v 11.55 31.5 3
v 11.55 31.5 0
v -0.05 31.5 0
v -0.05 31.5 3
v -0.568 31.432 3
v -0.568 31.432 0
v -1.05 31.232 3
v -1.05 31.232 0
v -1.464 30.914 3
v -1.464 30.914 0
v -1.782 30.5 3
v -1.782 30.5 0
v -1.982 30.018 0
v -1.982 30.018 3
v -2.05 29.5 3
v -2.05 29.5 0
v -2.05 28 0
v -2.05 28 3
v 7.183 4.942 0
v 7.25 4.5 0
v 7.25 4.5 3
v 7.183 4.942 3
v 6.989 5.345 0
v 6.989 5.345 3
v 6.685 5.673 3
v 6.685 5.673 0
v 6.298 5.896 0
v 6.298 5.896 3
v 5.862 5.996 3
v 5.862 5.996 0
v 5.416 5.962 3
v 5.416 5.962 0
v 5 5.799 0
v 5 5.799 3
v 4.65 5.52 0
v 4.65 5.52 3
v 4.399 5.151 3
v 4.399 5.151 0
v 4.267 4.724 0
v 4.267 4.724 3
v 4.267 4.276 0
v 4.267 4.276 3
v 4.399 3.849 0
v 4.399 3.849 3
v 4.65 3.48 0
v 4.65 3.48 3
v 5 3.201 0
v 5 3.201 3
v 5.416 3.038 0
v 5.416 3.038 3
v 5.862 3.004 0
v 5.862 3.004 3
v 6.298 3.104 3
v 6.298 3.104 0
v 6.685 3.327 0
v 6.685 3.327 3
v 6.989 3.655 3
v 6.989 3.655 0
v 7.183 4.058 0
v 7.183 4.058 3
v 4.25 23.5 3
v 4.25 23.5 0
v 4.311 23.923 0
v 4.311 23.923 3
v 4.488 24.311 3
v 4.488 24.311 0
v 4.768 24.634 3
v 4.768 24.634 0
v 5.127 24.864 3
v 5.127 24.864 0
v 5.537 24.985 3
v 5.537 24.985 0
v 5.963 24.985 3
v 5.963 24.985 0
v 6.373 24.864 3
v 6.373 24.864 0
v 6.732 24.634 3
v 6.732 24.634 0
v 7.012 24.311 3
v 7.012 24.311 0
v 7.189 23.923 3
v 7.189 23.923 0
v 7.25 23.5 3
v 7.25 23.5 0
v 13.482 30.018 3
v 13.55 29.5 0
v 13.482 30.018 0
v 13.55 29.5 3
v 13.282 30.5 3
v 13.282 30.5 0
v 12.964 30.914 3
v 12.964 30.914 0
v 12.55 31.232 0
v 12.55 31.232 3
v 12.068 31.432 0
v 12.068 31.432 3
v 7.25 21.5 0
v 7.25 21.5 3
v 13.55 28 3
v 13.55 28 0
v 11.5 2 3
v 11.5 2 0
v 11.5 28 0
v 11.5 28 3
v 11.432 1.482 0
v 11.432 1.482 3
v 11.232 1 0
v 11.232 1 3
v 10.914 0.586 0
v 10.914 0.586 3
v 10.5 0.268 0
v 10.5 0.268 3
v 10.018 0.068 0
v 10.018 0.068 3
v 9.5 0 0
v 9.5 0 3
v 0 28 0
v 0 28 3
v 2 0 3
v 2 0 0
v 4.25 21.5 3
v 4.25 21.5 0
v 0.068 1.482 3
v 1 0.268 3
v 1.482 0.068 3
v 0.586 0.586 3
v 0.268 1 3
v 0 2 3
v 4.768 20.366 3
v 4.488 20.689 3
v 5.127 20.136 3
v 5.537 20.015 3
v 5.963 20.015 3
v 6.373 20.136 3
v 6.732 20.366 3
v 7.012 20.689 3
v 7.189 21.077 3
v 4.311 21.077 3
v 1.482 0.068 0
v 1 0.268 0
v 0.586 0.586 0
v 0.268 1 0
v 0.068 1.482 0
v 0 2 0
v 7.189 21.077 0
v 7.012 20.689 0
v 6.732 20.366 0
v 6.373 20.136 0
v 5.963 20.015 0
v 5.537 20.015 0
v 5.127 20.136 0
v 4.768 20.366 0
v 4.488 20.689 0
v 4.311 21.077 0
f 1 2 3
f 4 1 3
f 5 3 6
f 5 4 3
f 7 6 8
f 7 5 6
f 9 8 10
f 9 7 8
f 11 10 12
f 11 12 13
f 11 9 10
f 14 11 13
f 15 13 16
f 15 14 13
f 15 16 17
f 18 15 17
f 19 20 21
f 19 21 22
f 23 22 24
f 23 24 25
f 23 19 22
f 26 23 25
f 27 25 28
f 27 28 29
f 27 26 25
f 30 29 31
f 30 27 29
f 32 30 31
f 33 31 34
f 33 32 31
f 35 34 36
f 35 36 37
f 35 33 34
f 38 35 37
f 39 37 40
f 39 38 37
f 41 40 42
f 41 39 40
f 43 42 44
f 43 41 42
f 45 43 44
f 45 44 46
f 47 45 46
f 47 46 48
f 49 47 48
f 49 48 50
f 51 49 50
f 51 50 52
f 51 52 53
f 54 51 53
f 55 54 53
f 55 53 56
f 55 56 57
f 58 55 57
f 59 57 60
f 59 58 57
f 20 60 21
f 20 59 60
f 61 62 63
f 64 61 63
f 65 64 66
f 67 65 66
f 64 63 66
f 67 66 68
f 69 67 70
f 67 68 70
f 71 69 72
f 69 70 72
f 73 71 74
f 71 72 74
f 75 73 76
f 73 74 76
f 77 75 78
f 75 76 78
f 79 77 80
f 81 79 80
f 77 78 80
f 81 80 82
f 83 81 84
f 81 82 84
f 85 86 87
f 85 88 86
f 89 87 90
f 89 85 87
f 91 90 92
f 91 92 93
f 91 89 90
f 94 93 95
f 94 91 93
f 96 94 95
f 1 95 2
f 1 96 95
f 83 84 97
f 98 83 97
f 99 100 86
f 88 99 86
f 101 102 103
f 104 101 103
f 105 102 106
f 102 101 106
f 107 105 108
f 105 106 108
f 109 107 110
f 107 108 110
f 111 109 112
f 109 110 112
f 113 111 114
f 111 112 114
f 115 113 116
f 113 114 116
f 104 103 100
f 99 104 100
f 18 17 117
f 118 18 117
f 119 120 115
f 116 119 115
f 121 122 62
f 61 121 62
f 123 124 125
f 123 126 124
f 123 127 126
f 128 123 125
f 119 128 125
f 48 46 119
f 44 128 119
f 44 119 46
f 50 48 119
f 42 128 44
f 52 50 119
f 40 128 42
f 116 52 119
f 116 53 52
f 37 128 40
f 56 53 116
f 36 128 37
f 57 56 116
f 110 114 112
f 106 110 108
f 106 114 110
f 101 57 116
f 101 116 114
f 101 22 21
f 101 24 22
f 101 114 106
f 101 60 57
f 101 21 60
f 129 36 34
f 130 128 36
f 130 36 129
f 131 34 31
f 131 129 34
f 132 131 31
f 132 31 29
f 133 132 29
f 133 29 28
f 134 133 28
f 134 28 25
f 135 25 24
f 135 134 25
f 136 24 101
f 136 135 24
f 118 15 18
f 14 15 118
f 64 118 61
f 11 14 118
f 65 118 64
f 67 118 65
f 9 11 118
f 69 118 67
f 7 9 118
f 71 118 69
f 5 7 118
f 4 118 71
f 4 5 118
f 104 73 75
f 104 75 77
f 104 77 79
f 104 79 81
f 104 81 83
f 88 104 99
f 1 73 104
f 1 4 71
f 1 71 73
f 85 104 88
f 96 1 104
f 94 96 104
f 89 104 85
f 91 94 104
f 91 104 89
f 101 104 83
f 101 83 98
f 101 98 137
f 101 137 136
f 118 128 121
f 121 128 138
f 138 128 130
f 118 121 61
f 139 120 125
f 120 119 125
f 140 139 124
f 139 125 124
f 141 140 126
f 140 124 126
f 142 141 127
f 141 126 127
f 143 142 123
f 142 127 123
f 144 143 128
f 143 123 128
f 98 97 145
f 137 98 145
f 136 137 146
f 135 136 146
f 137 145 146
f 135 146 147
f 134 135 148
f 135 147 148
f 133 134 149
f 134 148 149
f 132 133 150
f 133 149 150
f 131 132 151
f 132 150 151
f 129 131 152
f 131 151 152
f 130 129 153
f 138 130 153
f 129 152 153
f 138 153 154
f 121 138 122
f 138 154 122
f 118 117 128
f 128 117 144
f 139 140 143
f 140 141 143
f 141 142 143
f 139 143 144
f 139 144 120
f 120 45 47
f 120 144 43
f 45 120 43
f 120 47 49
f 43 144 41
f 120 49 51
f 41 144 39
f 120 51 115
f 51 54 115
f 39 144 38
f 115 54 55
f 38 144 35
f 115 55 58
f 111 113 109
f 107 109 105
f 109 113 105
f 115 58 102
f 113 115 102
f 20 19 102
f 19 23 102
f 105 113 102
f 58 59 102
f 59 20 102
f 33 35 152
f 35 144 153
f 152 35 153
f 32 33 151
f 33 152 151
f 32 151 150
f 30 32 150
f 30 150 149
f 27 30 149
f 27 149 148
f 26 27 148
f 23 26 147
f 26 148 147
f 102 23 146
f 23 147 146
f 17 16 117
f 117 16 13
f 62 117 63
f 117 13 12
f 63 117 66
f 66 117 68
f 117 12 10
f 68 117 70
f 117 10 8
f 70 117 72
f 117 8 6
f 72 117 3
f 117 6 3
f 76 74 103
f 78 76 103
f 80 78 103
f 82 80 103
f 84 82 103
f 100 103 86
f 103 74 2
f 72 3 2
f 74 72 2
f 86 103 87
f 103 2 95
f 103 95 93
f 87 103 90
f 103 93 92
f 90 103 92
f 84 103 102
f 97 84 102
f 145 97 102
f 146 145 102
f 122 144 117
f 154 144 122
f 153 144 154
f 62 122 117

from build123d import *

# Parameters (mm, degrees)
ESBO_O1_R                = 1.5
RESSALTO_EXTRUS_O1_DEPTH = 3
FILETE1_R                = 2
FILETE2_R                = 2


with BuildPart() as part:
    # Esboço1 → Ressalto-extrusão1 (new body)
    with BuildSketch(Plane.XY):
        Polygon((11.5, 28), (13.55, 28), (13.55, 31.5), (-2.05, 31.5), (-2.05, 28), (0, 28), (0, 0), (11.5, 0), align=None)
        with Locations((5.75, 4.5)):
            Circle(ESBO_O1_R, mode=Mode.SUBTRACT)
        with BuildLine():
            Line((4.25, 21.5), (4.25, 23.5))
            ThreePointArc((4.25, 23.5), (5.75, 25), (7.25, 23.5))
            Line((7.25, 23.5), (7.25, 21.5))
            ThreePointArc((7.25, 21.5), (5.75, 20), (4.25, 21.5))
        make_face(mode=Mode.SUBTRACT)
    extrude(amount=RESSALTO_EXTRUS_O1_DEPTH)

    # Filete1
    filete1_edges = [part.edges().sort_by_distance(p)[0] for p in [
        (-2.05, 31.5, 1.5),
        (13.55, 31.5, 1.5),
    ]]
    fillet(filete1_edges, radius=FILETE1_R)

    # Filete2
    filete2_edges = [part.edges().sort_by_distance(p)[0] for p in [
        (11.5, 0, 1.5),
        (0, 0, 1.5),
    ]]
    fillet(filete2_edges, radius=FILETE2_R)


solid = part.part
